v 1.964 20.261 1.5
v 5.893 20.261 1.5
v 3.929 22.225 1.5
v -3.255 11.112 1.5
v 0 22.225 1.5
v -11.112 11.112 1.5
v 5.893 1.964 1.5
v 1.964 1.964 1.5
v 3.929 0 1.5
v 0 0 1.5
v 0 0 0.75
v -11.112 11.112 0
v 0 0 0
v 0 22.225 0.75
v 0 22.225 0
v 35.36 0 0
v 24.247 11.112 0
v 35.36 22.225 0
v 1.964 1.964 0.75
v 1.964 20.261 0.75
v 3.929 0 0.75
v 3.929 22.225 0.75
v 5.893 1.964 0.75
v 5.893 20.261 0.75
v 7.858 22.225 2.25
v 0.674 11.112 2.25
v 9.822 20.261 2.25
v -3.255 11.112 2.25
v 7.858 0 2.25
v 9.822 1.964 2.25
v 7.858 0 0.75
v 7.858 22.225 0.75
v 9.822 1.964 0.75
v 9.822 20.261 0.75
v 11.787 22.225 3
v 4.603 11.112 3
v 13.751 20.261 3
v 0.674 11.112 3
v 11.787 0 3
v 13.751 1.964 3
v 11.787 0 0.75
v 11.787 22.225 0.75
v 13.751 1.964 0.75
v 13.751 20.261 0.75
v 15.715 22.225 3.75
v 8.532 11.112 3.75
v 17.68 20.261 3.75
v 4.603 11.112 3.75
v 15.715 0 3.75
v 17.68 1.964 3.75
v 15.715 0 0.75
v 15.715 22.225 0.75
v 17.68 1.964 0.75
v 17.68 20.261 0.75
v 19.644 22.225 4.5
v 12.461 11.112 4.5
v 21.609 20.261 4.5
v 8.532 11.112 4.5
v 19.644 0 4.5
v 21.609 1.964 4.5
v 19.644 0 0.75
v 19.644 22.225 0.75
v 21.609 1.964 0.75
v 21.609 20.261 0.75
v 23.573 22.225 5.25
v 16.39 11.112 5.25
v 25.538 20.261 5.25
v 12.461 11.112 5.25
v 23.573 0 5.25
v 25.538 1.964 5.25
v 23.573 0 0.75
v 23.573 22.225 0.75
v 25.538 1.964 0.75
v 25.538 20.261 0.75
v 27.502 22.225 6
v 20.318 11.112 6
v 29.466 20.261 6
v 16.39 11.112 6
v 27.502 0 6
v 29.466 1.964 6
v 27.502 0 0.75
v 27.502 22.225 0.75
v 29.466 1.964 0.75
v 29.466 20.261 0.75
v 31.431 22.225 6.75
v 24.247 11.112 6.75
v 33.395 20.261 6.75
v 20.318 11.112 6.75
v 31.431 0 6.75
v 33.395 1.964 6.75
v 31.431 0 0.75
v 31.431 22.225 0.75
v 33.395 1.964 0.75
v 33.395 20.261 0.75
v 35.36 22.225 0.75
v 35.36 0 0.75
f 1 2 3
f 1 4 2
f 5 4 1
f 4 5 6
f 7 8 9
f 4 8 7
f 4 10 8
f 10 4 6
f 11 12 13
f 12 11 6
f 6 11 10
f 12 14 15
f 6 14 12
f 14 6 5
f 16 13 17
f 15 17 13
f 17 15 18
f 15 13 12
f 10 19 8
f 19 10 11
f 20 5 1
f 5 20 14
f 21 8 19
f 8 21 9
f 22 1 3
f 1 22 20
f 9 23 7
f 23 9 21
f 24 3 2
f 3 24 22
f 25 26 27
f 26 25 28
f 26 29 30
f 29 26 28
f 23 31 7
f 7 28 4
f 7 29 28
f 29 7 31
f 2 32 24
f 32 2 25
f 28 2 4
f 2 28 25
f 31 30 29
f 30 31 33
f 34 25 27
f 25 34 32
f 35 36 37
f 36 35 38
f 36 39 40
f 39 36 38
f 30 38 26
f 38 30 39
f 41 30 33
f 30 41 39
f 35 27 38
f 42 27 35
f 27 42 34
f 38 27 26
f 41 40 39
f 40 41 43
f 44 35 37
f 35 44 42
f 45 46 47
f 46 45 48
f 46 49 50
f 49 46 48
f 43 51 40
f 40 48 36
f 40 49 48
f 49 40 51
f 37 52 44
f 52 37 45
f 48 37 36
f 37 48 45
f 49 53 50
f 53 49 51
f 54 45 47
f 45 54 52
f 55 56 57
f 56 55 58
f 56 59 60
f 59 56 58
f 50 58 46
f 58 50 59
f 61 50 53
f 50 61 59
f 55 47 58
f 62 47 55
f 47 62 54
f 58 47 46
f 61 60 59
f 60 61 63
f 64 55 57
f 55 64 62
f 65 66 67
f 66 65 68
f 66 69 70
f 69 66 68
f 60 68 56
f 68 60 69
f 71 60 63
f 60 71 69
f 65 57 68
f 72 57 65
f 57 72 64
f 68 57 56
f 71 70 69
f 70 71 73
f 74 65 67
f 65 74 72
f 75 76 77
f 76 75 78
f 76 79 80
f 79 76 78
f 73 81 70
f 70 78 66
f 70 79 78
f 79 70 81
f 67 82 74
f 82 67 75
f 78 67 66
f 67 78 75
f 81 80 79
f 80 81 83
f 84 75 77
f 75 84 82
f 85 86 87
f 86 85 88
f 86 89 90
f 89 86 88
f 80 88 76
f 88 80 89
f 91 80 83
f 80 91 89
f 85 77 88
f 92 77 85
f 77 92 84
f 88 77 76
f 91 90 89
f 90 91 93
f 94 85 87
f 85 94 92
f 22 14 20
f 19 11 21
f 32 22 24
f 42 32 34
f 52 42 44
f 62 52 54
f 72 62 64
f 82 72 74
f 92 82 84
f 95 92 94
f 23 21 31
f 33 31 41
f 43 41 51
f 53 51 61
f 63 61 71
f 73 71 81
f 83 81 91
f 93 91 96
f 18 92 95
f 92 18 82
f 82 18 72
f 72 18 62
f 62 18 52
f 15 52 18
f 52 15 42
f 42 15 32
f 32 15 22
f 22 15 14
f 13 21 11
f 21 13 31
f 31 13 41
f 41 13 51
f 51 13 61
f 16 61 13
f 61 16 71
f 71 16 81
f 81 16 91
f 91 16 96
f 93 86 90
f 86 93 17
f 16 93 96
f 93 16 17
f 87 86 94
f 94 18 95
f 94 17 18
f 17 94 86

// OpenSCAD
$tileH = 22.225;
$m = $tileH / 10;
$c = sqrt(pow($tileH, 2)/2);
$d = .75;
$fn = 3;
$links = 8;

difference() {
union() {
translate([0, 0, 0]) {
    cube([$tileH*$links/4, $tileH, $d]);
}
for (i = [0:$links]) {
     translate([i * $c/4, 0, 0]) {
        rotate([0, 0, 45]) {
            if (i==0) {
                cube([$c, $c, 1.5]);
            } else {
               cube([$c, $c, $d*(i+1)]);
            }
        }
        if (i < $links-1) {
            translate([-$tileH/4, $tileH/2-$m/2, $d*i]) {
       //  rotate([0, 50, 0]) {
        //    cube([$m, $m, $m *2]);
        //}
      }
  }
     }
}

}

translate([($links+1) * $c/4, 0, -2]) {
        rotate([0, 0, 45]) {
            cube([$c, $c, $d * ($links+1)*2]);
        }
     }
translate([($links+1) * $c/4, -$c, -2]) {
            cube([$c*3, $c*3, $d * 25]);
     }
translate([-$tileH, 0, -$d*3]) {
    cube([$tileH*$links/2, $tileH, $d*3]);
}
}

 
